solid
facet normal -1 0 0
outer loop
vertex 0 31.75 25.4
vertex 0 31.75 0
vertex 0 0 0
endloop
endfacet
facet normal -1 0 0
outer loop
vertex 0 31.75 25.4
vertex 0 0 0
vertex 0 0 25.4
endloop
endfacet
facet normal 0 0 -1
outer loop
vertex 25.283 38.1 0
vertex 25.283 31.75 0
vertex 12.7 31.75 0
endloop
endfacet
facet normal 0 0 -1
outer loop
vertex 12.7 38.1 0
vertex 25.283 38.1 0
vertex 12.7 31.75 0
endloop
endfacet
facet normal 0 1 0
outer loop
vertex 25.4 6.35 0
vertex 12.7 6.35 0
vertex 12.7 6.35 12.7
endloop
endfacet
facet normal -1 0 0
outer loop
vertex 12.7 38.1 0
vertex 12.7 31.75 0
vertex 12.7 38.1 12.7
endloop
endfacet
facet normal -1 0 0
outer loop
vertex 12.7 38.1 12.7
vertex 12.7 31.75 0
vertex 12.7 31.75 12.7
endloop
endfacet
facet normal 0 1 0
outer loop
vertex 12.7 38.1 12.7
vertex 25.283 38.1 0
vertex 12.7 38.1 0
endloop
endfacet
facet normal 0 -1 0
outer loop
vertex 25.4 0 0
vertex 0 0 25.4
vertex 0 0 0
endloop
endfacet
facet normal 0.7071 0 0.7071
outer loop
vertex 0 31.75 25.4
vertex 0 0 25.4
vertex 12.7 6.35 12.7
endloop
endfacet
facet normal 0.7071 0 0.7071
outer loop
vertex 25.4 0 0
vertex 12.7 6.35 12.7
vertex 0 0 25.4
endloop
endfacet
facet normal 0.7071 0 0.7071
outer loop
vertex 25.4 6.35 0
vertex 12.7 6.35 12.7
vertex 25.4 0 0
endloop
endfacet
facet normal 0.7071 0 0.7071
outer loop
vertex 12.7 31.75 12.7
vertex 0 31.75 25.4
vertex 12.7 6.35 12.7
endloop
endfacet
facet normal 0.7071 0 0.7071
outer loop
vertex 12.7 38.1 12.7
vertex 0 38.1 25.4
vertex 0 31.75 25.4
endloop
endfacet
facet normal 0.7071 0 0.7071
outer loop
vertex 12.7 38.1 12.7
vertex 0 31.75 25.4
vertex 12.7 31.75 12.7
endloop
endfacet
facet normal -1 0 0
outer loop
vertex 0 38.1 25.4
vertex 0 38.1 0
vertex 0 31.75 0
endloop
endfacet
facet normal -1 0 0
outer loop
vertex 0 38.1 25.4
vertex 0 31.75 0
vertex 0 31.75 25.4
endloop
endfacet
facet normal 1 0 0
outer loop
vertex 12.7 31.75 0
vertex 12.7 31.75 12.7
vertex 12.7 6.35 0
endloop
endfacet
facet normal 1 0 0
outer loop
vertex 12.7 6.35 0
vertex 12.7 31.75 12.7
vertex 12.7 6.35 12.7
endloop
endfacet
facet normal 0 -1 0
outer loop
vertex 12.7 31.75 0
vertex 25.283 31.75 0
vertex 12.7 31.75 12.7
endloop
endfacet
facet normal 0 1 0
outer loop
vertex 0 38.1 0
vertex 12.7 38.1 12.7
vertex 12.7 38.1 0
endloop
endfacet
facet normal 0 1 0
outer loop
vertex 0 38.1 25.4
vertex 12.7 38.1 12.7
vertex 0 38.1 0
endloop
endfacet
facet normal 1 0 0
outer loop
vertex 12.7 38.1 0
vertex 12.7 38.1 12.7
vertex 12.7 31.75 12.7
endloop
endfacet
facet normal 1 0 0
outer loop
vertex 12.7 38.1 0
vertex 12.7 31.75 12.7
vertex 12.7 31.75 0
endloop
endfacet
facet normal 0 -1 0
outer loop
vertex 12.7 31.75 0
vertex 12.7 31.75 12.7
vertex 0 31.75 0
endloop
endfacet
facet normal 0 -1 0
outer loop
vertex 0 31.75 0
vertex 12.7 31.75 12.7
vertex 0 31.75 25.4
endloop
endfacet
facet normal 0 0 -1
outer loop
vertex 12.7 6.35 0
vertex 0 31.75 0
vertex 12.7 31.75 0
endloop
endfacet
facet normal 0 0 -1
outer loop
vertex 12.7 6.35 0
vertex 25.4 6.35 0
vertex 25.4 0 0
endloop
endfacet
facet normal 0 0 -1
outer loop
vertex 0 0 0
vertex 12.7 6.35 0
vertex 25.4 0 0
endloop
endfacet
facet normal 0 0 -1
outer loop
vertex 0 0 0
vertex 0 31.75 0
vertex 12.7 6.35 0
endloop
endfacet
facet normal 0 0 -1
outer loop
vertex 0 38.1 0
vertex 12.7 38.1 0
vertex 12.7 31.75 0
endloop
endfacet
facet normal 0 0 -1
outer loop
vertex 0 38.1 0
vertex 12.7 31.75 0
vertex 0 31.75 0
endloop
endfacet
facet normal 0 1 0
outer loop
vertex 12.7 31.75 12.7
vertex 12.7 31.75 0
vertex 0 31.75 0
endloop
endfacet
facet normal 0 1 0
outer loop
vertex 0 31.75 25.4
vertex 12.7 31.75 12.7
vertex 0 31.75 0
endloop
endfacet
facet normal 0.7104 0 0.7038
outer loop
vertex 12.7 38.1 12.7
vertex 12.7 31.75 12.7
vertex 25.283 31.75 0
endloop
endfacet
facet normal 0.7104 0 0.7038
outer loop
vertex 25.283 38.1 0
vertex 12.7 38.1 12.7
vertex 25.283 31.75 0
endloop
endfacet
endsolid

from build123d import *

# Parameters (mm, degrees)
F1_DEPTH = 6.35
F2_W     = 25.4
F2_H     = 12.7
F3_DEPTH = 12.7
F5_DEPTH = 25.4
F7_DEPTH = 6.35
F9_DEPTH = 6.35


with BuildPart() as f1:
    # F0 (on Front) → F1 (new body)
    with BuildSketch(Plane.XZ):
        Polygon((0, 25.4), (0, 0), (25.4, 0), align=None)
    extrude(amount=-F1_DEPTH)

    # F2 (on face) → F3 (join)
    with BuildSketch(Plane(origin=(0, 0, 0), x_dir=(0, -1, 0), z_dir=(-1, 0, 0))):
        with Locations((-19.05, 6.35)):
            Rectangle(F2_W, F2_H)
    extrude(amount=-F3_DEPTH)

    # F4 (on face) → F5 (join)
    with BuildSketch(Plane(origin=(0, 31.75, 0), x_dir=(-1, 0, 0), z_dir=(0, 1, 0))):
        Polygon((-12.7, 12.7), (0, 12.7), (0, 25.4), align=None)
    extrude(amount=-F5_DEPTH)


with BuildPart() as f7:
    # F6 (on face) → F7 (new body)
    with BuildSketch(Plane(origin=(0, 31.75, 0), x_dir=(-1, 0, 0), z_dir=(0, 1, 0))):
        Polygon((-25.282543, 0), (-12.7, 0), (-12.7, 12.7), align=None)
    extrude(amount=F7_DEPTH)


with BuildPart() as f9:
    # F8 (on face) → F9 (new body)
    with BuildSketch(Plane(origin=(0, 38.1, 0), x_dir=(-1, 0, 0), z_dir=(0, 1, 0))):
        Polygon((0, 25.4), (-12.7, 12.7), (-12.7, 0), (0, 0), align=None)
    extrude(amount=-F9_DEPTH)


solid = Compound([f1.part, f7.part, f9.part])
